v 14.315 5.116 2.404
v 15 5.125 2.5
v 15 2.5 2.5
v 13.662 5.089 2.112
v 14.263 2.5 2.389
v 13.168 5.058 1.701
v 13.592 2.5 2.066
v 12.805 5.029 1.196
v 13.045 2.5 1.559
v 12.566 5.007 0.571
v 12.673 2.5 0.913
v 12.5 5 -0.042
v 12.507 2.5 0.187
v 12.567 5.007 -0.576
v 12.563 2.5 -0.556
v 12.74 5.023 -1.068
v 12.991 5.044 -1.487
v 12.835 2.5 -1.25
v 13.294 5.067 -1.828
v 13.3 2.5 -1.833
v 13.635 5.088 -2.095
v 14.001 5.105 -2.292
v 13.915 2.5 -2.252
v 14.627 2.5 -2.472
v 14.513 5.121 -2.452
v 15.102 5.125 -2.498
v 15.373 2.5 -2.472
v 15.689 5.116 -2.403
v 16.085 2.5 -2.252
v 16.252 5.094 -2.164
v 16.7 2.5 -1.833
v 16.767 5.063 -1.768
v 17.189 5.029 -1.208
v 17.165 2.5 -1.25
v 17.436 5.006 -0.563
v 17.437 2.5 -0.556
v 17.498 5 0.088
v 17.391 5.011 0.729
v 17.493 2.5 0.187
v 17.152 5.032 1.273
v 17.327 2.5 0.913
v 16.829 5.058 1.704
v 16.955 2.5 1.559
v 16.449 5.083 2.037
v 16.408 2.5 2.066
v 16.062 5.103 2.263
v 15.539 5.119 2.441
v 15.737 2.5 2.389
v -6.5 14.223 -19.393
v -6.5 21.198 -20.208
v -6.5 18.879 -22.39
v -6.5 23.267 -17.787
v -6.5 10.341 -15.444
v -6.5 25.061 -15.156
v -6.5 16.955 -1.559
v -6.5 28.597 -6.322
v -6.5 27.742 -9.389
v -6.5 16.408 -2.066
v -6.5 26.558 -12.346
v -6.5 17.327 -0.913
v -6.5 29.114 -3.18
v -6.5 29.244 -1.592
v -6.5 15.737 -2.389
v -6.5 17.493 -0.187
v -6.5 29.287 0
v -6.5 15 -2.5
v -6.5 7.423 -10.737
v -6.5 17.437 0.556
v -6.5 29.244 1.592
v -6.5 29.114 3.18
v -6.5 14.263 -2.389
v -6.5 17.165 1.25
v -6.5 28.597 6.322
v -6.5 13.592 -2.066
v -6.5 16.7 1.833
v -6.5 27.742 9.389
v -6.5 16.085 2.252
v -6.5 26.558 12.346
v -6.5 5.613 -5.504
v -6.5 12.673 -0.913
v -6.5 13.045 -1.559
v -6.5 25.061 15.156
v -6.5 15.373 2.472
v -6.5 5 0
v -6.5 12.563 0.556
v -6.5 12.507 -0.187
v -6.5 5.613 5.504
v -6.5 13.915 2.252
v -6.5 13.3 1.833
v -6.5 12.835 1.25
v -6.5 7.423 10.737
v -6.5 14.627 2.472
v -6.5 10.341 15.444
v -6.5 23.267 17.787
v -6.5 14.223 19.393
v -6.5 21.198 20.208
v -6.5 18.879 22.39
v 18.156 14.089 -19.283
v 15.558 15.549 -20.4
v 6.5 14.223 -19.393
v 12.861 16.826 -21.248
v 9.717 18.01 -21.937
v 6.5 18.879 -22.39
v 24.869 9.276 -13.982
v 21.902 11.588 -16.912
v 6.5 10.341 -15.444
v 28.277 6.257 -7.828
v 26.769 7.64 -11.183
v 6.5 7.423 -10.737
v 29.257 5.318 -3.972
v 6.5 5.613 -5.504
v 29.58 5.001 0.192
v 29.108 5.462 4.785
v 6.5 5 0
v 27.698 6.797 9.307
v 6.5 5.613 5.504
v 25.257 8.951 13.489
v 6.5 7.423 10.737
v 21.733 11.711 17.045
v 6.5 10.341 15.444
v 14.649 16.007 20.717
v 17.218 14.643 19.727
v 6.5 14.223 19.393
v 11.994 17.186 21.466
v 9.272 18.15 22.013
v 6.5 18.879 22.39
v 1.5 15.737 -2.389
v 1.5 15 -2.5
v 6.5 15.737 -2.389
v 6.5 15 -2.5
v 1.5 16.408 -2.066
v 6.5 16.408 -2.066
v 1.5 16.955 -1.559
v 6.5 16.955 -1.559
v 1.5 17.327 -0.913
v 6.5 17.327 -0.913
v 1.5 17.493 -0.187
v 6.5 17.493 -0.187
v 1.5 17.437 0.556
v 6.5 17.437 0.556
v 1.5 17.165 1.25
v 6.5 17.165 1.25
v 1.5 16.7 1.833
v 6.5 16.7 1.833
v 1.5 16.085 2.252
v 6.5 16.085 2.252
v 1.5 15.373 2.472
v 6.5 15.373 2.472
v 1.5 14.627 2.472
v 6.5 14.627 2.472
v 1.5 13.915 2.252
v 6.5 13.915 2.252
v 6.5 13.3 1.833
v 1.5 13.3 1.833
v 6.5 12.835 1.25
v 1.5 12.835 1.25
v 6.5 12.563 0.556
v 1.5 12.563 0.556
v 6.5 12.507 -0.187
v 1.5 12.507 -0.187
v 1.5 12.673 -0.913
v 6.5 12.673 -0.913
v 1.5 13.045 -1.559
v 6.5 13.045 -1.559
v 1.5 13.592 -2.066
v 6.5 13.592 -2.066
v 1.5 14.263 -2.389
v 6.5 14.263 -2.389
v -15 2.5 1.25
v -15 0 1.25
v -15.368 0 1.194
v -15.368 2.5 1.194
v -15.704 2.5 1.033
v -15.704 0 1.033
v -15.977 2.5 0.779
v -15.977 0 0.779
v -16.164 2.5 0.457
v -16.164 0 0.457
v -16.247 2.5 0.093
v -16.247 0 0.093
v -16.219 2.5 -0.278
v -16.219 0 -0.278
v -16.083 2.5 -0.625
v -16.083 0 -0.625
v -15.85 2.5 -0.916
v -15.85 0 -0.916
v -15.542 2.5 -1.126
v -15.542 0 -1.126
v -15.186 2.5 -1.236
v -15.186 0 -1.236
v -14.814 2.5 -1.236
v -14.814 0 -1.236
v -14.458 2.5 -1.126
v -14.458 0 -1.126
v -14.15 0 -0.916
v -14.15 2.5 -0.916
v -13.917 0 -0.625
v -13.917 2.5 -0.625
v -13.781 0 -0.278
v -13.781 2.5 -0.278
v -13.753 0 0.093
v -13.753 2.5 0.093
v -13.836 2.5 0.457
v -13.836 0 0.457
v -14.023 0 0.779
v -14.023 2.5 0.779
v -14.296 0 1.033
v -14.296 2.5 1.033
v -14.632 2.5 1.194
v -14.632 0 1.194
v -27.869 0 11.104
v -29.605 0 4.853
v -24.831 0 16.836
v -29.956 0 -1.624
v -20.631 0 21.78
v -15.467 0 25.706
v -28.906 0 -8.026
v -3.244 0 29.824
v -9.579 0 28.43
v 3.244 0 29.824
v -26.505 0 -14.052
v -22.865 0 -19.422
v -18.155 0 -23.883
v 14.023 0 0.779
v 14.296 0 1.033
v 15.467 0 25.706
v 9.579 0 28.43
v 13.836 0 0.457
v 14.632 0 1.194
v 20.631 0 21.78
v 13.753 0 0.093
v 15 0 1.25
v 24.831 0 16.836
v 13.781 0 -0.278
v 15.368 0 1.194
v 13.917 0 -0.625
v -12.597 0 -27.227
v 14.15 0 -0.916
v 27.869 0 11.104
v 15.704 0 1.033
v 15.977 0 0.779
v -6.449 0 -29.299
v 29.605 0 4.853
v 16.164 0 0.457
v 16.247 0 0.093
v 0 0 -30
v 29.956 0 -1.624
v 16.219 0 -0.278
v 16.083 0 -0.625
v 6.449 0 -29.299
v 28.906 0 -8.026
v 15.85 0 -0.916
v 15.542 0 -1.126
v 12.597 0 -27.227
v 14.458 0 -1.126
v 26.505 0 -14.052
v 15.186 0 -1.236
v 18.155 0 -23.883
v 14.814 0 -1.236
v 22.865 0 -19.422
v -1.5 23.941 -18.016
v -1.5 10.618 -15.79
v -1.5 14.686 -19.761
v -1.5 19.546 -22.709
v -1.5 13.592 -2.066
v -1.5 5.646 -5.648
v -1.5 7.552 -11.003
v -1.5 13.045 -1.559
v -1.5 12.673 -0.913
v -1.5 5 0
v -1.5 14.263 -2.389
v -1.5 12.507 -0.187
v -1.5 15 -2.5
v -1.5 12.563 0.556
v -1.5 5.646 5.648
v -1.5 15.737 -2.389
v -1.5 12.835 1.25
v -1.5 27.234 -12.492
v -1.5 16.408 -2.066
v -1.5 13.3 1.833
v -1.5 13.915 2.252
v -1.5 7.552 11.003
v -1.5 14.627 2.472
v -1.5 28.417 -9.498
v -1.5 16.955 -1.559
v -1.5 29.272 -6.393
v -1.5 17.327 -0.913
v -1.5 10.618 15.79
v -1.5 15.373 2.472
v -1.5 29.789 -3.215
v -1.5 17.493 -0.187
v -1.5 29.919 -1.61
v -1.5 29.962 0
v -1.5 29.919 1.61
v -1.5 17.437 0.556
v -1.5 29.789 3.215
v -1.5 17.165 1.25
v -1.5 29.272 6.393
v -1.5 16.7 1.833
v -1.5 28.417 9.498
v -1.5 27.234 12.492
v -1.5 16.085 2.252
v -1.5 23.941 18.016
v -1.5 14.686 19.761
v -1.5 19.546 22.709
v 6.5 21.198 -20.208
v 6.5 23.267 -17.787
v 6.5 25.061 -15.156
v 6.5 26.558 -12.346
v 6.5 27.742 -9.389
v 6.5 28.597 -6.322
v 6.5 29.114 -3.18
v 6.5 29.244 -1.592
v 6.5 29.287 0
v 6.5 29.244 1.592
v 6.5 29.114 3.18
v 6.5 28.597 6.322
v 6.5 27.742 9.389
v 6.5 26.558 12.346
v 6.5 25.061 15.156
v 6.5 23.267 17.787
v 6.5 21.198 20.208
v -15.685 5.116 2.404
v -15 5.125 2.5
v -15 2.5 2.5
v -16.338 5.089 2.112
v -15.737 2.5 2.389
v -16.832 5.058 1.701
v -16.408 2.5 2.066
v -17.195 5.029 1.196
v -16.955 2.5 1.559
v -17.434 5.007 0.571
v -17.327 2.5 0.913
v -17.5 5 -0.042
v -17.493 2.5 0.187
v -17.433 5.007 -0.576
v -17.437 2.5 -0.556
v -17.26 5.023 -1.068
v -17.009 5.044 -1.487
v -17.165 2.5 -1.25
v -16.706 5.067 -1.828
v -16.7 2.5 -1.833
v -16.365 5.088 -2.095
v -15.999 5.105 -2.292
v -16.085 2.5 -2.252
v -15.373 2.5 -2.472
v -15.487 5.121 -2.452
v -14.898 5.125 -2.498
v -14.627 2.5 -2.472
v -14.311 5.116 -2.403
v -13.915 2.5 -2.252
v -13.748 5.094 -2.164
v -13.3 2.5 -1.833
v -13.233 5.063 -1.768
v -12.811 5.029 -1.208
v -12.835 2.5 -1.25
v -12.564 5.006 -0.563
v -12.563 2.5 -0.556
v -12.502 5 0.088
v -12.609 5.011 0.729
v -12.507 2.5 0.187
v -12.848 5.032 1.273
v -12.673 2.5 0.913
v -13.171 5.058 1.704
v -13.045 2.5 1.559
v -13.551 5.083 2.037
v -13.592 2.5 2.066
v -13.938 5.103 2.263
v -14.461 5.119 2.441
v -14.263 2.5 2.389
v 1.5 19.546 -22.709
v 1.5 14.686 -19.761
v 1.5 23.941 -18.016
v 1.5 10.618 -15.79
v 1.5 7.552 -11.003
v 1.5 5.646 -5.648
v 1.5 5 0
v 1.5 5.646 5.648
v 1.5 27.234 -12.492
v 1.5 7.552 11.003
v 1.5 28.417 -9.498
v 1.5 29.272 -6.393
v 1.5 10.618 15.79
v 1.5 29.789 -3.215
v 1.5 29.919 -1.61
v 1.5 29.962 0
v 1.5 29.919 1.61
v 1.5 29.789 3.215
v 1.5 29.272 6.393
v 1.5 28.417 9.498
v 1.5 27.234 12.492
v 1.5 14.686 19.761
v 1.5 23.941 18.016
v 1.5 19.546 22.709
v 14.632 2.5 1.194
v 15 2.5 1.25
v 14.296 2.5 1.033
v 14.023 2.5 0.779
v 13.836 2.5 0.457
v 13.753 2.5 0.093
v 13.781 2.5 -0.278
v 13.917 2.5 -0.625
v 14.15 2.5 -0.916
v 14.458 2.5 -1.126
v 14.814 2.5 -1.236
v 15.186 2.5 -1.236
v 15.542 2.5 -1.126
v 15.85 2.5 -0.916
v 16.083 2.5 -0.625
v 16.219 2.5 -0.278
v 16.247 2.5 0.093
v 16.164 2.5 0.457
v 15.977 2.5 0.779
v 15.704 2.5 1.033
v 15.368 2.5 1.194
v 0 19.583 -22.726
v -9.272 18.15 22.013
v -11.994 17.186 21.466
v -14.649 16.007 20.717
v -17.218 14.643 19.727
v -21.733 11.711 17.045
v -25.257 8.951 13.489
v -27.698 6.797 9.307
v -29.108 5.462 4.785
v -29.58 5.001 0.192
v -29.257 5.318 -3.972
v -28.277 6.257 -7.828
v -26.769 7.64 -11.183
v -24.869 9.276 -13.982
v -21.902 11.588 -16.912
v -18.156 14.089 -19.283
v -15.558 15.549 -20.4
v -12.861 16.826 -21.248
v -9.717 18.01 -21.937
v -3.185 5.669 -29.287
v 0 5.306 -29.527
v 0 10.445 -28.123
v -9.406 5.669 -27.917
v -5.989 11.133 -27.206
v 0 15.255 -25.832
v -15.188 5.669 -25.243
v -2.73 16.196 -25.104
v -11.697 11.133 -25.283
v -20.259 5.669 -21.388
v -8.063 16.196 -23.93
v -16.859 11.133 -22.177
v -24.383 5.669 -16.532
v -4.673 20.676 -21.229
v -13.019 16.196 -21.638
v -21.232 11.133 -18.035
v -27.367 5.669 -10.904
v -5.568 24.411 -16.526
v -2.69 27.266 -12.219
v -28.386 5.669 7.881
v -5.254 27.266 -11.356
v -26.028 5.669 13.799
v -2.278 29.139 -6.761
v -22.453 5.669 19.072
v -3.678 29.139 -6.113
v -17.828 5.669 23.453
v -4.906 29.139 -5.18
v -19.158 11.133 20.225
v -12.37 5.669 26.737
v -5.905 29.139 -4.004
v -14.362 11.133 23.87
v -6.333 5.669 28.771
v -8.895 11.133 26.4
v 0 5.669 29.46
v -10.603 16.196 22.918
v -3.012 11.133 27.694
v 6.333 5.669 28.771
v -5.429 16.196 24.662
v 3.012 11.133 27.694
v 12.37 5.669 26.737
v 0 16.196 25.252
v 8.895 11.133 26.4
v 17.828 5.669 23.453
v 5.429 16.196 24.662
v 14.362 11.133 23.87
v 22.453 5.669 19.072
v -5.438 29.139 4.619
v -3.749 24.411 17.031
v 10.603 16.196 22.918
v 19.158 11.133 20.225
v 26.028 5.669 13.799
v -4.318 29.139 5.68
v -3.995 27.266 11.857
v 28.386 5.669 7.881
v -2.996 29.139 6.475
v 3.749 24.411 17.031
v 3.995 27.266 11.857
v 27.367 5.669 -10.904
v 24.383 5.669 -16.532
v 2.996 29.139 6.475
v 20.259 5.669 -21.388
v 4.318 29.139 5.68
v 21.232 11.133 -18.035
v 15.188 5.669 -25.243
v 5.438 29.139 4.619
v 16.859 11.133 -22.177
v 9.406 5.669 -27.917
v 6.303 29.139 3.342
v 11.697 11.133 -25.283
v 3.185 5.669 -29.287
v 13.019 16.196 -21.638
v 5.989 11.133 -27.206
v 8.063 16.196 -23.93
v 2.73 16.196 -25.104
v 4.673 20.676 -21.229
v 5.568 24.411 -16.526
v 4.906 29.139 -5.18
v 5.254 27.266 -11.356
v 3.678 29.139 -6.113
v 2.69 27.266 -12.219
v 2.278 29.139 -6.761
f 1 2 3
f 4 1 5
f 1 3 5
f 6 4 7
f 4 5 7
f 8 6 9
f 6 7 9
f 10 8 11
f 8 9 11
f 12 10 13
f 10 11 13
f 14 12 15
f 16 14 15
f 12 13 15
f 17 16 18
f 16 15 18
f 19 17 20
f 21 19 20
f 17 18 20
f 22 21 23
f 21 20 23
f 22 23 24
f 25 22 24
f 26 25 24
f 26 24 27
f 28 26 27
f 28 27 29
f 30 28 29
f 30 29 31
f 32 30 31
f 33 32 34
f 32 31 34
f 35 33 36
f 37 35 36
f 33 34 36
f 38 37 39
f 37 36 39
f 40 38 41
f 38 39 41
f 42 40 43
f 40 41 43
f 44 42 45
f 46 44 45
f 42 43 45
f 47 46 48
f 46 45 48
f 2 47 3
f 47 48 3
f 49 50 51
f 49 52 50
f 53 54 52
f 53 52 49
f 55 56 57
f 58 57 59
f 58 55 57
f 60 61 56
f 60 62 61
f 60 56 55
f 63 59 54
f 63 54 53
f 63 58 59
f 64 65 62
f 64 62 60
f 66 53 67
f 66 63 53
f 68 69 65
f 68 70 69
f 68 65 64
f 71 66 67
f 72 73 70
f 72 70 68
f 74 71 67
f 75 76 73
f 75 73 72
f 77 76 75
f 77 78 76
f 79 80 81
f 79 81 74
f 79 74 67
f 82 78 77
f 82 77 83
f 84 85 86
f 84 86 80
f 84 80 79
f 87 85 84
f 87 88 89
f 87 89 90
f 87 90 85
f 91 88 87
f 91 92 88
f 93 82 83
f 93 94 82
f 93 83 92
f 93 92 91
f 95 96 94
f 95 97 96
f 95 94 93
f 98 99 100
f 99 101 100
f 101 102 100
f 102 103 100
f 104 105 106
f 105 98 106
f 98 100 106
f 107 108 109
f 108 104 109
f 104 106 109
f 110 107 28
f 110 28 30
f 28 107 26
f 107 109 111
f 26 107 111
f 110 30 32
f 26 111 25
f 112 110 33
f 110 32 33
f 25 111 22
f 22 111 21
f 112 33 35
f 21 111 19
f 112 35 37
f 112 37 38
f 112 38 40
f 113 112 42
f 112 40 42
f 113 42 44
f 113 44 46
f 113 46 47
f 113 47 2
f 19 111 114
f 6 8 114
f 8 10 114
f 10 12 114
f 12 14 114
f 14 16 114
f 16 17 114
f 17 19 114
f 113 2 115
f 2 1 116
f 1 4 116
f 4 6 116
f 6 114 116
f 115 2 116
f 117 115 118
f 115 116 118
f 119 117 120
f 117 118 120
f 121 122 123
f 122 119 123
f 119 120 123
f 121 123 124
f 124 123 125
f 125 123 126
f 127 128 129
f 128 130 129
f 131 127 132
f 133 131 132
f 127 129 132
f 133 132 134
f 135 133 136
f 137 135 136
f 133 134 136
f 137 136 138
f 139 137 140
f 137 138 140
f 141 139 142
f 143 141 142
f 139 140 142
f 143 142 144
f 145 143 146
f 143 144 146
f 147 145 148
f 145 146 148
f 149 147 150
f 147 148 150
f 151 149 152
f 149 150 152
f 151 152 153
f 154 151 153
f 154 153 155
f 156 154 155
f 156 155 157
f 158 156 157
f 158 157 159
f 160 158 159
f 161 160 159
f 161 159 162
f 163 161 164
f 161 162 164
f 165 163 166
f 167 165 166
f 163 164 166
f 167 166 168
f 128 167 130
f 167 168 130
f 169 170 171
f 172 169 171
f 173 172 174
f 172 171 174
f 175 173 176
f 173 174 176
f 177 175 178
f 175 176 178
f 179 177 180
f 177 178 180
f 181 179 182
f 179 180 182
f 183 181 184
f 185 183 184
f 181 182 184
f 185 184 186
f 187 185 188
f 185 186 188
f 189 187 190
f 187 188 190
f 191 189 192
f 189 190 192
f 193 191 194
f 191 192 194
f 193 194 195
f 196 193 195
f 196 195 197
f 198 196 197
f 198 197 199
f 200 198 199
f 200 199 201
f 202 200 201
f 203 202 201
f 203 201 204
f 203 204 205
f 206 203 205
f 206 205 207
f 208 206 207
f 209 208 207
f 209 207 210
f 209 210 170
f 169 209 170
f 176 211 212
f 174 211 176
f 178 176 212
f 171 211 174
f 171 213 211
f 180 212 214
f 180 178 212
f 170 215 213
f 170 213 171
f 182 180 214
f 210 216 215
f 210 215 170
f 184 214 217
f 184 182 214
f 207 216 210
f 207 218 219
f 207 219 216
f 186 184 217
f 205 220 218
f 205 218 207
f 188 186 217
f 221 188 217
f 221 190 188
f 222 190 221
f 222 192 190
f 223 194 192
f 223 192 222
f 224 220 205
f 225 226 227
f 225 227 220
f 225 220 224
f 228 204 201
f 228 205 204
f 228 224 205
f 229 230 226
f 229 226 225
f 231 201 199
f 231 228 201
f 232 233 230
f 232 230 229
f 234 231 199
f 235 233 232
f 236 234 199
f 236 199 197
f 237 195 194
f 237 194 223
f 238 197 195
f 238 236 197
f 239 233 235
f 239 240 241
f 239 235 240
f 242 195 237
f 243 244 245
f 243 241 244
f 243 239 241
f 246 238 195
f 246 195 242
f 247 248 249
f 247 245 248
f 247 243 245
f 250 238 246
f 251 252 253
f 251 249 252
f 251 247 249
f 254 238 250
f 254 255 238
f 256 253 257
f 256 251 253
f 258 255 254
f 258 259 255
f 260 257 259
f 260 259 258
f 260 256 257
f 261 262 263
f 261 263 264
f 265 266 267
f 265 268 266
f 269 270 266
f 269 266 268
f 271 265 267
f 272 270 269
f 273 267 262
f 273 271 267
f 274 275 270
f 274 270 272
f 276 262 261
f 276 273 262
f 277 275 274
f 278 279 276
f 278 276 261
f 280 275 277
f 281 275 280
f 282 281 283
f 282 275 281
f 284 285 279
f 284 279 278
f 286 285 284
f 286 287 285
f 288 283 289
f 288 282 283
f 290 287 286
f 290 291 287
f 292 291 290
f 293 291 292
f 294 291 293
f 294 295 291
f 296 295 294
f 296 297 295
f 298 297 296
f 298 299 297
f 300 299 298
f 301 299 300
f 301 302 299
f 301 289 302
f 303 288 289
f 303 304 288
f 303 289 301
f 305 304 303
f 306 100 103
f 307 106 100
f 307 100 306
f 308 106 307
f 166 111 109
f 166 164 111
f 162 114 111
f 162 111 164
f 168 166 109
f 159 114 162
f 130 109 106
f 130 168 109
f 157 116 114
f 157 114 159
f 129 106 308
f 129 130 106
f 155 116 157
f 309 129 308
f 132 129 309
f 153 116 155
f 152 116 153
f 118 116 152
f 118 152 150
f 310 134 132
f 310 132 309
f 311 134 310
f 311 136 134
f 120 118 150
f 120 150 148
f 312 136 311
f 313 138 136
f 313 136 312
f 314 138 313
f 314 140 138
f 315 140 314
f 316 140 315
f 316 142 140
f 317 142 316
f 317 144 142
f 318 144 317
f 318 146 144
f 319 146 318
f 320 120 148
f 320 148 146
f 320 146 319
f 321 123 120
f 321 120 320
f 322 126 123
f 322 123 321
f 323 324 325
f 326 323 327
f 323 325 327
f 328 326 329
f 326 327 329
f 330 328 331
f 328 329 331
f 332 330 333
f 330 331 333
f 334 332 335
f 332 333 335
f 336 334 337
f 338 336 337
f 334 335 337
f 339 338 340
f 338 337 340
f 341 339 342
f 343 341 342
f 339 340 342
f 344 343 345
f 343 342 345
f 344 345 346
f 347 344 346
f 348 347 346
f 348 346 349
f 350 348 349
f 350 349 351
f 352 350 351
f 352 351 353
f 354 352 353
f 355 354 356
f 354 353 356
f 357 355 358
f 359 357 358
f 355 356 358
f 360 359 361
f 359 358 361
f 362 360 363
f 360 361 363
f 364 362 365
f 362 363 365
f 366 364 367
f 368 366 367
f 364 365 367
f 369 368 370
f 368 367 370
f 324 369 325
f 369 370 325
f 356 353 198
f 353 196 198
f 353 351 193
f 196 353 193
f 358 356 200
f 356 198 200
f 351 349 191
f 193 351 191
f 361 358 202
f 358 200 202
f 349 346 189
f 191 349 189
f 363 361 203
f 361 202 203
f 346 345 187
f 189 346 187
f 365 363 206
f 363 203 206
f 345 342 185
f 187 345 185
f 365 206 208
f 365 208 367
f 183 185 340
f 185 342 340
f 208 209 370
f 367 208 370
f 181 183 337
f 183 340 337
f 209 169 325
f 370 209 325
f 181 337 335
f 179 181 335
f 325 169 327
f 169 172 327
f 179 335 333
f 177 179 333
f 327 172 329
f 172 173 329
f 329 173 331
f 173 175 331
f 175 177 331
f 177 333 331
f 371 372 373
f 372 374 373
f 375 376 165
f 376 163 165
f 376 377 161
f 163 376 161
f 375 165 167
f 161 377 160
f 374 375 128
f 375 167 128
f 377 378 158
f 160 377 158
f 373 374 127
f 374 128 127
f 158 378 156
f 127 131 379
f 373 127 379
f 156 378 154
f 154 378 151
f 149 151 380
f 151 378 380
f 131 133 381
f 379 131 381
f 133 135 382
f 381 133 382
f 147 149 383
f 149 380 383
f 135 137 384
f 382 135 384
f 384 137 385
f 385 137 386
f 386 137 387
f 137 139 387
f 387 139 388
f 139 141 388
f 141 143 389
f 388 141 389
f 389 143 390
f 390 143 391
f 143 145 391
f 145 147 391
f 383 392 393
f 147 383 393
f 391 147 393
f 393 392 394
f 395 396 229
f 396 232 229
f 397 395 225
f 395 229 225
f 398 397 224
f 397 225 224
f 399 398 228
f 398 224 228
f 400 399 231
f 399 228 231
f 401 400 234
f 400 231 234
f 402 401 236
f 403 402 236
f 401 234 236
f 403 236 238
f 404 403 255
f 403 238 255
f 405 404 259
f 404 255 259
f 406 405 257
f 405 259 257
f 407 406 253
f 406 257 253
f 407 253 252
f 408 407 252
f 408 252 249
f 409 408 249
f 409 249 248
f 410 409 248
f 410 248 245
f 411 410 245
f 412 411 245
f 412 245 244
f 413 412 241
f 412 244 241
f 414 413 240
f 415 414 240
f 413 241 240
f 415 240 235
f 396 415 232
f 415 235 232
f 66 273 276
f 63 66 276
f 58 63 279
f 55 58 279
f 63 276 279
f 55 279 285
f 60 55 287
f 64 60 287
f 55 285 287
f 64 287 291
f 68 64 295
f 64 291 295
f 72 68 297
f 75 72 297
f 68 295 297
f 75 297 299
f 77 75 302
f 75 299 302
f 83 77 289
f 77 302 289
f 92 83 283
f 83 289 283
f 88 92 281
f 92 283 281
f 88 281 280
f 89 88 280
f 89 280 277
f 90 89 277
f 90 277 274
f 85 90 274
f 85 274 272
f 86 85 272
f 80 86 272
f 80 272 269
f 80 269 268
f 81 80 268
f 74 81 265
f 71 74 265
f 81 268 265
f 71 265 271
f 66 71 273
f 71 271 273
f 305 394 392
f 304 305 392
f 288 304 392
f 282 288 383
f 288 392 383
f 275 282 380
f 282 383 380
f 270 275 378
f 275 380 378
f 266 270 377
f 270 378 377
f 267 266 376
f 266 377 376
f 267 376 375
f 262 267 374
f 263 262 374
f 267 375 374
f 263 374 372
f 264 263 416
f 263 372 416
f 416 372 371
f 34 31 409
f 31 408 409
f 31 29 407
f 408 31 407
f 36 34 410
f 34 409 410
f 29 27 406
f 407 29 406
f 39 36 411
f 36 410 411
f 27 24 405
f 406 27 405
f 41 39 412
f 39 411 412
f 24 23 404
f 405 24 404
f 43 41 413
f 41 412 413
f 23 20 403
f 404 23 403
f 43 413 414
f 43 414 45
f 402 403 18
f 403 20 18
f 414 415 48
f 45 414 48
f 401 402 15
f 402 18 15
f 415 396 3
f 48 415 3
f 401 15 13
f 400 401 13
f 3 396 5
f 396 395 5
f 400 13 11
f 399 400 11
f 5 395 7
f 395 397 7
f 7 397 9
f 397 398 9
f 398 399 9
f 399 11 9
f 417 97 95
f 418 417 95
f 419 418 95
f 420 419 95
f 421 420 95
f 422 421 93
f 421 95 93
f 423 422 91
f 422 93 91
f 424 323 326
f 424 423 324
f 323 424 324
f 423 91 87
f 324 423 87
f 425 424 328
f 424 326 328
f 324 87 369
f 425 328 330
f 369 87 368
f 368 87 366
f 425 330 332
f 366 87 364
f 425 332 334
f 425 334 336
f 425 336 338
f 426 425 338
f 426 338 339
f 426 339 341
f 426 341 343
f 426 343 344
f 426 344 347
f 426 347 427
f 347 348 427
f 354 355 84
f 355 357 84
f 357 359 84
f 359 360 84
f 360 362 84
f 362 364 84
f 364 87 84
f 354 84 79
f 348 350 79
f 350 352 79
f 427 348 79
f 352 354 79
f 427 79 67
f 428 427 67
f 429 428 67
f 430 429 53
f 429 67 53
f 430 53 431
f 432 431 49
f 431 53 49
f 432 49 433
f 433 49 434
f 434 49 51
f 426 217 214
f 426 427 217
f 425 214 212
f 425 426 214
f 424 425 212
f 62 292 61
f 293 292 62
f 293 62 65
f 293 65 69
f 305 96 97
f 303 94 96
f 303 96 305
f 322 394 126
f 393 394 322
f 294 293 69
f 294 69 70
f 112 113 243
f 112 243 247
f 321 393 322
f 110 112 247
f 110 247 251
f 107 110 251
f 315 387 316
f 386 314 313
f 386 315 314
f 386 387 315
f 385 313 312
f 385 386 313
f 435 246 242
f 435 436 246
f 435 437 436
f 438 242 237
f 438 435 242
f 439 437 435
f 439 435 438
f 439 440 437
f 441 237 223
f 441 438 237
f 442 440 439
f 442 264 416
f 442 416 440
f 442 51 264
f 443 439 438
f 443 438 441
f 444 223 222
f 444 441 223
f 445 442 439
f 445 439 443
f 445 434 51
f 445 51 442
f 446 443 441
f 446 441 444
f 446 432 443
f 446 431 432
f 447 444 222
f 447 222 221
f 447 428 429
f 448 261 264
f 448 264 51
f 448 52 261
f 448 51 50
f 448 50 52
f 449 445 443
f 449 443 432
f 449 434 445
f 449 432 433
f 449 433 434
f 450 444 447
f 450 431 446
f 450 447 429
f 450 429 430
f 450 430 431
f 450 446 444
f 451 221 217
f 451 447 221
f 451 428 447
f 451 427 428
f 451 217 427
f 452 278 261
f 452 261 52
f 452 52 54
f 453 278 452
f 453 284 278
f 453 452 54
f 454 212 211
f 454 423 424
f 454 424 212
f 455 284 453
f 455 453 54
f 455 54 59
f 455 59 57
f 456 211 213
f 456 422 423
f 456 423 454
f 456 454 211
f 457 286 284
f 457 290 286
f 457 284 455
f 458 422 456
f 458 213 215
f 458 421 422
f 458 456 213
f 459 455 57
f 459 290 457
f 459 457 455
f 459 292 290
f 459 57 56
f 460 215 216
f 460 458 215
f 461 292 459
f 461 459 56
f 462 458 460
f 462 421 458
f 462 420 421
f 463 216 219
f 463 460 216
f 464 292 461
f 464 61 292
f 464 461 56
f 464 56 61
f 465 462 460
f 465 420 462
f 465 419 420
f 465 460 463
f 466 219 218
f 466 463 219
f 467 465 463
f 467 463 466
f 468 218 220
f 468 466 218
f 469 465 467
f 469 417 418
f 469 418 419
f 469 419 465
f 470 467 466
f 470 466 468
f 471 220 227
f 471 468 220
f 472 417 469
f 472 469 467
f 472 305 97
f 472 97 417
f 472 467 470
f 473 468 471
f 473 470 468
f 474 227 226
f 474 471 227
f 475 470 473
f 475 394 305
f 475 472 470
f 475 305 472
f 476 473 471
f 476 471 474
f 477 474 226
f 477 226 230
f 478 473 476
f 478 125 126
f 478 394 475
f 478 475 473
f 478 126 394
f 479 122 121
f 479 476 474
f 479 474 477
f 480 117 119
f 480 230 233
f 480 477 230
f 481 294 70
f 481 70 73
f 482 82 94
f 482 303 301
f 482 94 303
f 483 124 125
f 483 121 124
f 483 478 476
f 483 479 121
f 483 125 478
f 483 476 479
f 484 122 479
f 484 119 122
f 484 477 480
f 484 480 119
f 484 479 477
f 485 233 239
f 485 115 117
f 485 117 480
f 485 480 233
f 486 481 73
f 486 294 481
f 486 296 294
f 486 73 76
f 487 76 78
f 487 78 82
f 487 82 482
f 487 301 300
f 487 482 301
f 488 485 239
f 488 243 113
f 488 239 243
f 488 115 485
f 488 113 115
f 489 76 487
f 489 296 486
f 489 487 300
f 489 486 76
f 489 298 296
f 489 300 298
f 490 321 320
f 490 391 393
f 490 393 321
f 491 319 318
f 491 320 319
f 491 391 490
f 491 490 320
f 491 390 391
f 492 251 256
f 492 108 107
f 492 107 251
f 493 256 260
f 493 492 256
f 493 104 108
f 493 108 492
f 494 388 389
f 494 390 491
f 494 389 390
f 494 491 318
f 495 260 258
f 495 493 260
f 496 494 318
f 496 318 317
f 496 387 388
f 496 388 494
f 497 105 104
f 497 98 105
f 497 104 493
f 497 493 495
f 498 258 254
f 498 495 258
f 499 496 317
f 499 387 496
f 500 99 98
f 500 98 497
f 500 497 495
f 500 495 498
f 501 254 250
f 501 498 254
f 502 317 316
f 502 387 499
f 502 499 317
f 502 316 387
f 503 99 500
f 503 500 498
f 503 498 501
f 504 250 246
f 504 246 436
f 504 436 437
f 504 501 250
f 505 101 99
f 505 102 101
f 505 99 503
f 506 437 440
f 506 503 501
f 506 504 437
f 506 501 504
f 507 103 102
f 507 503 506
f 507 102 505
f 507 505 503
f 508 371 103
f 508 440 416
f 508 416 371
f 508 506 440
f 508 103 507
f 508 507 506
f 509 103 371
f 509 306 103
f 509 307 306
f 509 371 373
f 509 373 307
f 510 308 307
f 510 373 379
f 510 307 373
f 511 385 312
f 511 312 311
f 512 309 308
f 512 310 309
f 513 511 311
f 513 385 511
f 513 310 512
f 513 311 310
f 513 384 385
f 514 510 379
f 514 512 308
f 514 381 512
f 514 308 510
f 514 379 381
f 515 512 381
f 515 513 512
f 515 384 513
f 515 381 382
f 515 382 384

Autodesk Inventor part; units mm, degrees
ref_plane "XY Plane" through (0, 0, 0) normal (0, 0, 1) x (1, 0, 0)
sketch "Sketch1" plane through (0, 0, 0) normal (1, 0, 0) x (0, 1, 0)
  arc A0 (0, -30) -> (30, 0) centre (0, 0) ccw
  line L0 (30, 0) -> (0, 0)
  line L1 (0, 0) -> (0, -30)
  dimension "d0" = 30
revolve "Revolution1" add sketch "Sketch1" angle 360 about axis through (0, 30, 0) along (0, -1, 0)
ref_plane "Work Plane1" through (6.5, 0, 0) normal (1, 0, 0) x (0, 1, 0)
sketch "Sketch3" plane through (6.5, 0, 0) normal (1, 0, 0) x (0, 1, 0)
  circle A0 centre (30, 0) radius 25
  line L0 (0, 30) -> (0, -30) projected
  point P0 (0, 0)
  dimension "d7" = 50
  dimension "d8" = 30
extrude "Extrusion2" cut sketch "Sketch3" along normal through all
mirror "Mirror1" about plane through (0, 0, 0) normal (1, 0, 0) of "Extrusion2"
sketch "Sketch4" plane through (0, 0, 0) normal (1, 0, 0) x (0, 1, 0)
  arc A0 (0, -30) -> (0, 30) centre (0, 0) ccw projected
  circle A1 centre (30, 0) radius 25
  dimension "d11" = 50
extrude "Extrusion3" cut sketch "Sketch4" along normal mid plane 3
sketch "Sketch5" plane through (6.5, 0, 0) normal (1, 0, 0) x (0, 0, -1)
  circle A0 centre (0, 15) radius 2.5
  line L0 (-30, 0) -> (30, 0) projected
  point P0 (0, 0)
  dimension "d14" = 5
  dimension "d15" = 15
extrude "Extrusion4" cut sketch "Sketch5" against normal through all
ref_plane "Work Plane2" through (0, 30, 0) normal (0, 1, 0) x (-1, 0, 0)
sketch "Sketch7" plane through (0, 30, 0) normal (0, 1, 0) x (-1, 0, 0)
  line L0 (15, 0) -> (-15, 0) construction
  point P0 (0, 0)
  point P1 (0, 0)
  dimension "d21" = 30
hole "Hole1" at (-15, 30, 0) at (15, 30, 0) direction (0, -1, 0) diameter 2.5 end through all counterbore diameter 5 counterbore depth 27.5
